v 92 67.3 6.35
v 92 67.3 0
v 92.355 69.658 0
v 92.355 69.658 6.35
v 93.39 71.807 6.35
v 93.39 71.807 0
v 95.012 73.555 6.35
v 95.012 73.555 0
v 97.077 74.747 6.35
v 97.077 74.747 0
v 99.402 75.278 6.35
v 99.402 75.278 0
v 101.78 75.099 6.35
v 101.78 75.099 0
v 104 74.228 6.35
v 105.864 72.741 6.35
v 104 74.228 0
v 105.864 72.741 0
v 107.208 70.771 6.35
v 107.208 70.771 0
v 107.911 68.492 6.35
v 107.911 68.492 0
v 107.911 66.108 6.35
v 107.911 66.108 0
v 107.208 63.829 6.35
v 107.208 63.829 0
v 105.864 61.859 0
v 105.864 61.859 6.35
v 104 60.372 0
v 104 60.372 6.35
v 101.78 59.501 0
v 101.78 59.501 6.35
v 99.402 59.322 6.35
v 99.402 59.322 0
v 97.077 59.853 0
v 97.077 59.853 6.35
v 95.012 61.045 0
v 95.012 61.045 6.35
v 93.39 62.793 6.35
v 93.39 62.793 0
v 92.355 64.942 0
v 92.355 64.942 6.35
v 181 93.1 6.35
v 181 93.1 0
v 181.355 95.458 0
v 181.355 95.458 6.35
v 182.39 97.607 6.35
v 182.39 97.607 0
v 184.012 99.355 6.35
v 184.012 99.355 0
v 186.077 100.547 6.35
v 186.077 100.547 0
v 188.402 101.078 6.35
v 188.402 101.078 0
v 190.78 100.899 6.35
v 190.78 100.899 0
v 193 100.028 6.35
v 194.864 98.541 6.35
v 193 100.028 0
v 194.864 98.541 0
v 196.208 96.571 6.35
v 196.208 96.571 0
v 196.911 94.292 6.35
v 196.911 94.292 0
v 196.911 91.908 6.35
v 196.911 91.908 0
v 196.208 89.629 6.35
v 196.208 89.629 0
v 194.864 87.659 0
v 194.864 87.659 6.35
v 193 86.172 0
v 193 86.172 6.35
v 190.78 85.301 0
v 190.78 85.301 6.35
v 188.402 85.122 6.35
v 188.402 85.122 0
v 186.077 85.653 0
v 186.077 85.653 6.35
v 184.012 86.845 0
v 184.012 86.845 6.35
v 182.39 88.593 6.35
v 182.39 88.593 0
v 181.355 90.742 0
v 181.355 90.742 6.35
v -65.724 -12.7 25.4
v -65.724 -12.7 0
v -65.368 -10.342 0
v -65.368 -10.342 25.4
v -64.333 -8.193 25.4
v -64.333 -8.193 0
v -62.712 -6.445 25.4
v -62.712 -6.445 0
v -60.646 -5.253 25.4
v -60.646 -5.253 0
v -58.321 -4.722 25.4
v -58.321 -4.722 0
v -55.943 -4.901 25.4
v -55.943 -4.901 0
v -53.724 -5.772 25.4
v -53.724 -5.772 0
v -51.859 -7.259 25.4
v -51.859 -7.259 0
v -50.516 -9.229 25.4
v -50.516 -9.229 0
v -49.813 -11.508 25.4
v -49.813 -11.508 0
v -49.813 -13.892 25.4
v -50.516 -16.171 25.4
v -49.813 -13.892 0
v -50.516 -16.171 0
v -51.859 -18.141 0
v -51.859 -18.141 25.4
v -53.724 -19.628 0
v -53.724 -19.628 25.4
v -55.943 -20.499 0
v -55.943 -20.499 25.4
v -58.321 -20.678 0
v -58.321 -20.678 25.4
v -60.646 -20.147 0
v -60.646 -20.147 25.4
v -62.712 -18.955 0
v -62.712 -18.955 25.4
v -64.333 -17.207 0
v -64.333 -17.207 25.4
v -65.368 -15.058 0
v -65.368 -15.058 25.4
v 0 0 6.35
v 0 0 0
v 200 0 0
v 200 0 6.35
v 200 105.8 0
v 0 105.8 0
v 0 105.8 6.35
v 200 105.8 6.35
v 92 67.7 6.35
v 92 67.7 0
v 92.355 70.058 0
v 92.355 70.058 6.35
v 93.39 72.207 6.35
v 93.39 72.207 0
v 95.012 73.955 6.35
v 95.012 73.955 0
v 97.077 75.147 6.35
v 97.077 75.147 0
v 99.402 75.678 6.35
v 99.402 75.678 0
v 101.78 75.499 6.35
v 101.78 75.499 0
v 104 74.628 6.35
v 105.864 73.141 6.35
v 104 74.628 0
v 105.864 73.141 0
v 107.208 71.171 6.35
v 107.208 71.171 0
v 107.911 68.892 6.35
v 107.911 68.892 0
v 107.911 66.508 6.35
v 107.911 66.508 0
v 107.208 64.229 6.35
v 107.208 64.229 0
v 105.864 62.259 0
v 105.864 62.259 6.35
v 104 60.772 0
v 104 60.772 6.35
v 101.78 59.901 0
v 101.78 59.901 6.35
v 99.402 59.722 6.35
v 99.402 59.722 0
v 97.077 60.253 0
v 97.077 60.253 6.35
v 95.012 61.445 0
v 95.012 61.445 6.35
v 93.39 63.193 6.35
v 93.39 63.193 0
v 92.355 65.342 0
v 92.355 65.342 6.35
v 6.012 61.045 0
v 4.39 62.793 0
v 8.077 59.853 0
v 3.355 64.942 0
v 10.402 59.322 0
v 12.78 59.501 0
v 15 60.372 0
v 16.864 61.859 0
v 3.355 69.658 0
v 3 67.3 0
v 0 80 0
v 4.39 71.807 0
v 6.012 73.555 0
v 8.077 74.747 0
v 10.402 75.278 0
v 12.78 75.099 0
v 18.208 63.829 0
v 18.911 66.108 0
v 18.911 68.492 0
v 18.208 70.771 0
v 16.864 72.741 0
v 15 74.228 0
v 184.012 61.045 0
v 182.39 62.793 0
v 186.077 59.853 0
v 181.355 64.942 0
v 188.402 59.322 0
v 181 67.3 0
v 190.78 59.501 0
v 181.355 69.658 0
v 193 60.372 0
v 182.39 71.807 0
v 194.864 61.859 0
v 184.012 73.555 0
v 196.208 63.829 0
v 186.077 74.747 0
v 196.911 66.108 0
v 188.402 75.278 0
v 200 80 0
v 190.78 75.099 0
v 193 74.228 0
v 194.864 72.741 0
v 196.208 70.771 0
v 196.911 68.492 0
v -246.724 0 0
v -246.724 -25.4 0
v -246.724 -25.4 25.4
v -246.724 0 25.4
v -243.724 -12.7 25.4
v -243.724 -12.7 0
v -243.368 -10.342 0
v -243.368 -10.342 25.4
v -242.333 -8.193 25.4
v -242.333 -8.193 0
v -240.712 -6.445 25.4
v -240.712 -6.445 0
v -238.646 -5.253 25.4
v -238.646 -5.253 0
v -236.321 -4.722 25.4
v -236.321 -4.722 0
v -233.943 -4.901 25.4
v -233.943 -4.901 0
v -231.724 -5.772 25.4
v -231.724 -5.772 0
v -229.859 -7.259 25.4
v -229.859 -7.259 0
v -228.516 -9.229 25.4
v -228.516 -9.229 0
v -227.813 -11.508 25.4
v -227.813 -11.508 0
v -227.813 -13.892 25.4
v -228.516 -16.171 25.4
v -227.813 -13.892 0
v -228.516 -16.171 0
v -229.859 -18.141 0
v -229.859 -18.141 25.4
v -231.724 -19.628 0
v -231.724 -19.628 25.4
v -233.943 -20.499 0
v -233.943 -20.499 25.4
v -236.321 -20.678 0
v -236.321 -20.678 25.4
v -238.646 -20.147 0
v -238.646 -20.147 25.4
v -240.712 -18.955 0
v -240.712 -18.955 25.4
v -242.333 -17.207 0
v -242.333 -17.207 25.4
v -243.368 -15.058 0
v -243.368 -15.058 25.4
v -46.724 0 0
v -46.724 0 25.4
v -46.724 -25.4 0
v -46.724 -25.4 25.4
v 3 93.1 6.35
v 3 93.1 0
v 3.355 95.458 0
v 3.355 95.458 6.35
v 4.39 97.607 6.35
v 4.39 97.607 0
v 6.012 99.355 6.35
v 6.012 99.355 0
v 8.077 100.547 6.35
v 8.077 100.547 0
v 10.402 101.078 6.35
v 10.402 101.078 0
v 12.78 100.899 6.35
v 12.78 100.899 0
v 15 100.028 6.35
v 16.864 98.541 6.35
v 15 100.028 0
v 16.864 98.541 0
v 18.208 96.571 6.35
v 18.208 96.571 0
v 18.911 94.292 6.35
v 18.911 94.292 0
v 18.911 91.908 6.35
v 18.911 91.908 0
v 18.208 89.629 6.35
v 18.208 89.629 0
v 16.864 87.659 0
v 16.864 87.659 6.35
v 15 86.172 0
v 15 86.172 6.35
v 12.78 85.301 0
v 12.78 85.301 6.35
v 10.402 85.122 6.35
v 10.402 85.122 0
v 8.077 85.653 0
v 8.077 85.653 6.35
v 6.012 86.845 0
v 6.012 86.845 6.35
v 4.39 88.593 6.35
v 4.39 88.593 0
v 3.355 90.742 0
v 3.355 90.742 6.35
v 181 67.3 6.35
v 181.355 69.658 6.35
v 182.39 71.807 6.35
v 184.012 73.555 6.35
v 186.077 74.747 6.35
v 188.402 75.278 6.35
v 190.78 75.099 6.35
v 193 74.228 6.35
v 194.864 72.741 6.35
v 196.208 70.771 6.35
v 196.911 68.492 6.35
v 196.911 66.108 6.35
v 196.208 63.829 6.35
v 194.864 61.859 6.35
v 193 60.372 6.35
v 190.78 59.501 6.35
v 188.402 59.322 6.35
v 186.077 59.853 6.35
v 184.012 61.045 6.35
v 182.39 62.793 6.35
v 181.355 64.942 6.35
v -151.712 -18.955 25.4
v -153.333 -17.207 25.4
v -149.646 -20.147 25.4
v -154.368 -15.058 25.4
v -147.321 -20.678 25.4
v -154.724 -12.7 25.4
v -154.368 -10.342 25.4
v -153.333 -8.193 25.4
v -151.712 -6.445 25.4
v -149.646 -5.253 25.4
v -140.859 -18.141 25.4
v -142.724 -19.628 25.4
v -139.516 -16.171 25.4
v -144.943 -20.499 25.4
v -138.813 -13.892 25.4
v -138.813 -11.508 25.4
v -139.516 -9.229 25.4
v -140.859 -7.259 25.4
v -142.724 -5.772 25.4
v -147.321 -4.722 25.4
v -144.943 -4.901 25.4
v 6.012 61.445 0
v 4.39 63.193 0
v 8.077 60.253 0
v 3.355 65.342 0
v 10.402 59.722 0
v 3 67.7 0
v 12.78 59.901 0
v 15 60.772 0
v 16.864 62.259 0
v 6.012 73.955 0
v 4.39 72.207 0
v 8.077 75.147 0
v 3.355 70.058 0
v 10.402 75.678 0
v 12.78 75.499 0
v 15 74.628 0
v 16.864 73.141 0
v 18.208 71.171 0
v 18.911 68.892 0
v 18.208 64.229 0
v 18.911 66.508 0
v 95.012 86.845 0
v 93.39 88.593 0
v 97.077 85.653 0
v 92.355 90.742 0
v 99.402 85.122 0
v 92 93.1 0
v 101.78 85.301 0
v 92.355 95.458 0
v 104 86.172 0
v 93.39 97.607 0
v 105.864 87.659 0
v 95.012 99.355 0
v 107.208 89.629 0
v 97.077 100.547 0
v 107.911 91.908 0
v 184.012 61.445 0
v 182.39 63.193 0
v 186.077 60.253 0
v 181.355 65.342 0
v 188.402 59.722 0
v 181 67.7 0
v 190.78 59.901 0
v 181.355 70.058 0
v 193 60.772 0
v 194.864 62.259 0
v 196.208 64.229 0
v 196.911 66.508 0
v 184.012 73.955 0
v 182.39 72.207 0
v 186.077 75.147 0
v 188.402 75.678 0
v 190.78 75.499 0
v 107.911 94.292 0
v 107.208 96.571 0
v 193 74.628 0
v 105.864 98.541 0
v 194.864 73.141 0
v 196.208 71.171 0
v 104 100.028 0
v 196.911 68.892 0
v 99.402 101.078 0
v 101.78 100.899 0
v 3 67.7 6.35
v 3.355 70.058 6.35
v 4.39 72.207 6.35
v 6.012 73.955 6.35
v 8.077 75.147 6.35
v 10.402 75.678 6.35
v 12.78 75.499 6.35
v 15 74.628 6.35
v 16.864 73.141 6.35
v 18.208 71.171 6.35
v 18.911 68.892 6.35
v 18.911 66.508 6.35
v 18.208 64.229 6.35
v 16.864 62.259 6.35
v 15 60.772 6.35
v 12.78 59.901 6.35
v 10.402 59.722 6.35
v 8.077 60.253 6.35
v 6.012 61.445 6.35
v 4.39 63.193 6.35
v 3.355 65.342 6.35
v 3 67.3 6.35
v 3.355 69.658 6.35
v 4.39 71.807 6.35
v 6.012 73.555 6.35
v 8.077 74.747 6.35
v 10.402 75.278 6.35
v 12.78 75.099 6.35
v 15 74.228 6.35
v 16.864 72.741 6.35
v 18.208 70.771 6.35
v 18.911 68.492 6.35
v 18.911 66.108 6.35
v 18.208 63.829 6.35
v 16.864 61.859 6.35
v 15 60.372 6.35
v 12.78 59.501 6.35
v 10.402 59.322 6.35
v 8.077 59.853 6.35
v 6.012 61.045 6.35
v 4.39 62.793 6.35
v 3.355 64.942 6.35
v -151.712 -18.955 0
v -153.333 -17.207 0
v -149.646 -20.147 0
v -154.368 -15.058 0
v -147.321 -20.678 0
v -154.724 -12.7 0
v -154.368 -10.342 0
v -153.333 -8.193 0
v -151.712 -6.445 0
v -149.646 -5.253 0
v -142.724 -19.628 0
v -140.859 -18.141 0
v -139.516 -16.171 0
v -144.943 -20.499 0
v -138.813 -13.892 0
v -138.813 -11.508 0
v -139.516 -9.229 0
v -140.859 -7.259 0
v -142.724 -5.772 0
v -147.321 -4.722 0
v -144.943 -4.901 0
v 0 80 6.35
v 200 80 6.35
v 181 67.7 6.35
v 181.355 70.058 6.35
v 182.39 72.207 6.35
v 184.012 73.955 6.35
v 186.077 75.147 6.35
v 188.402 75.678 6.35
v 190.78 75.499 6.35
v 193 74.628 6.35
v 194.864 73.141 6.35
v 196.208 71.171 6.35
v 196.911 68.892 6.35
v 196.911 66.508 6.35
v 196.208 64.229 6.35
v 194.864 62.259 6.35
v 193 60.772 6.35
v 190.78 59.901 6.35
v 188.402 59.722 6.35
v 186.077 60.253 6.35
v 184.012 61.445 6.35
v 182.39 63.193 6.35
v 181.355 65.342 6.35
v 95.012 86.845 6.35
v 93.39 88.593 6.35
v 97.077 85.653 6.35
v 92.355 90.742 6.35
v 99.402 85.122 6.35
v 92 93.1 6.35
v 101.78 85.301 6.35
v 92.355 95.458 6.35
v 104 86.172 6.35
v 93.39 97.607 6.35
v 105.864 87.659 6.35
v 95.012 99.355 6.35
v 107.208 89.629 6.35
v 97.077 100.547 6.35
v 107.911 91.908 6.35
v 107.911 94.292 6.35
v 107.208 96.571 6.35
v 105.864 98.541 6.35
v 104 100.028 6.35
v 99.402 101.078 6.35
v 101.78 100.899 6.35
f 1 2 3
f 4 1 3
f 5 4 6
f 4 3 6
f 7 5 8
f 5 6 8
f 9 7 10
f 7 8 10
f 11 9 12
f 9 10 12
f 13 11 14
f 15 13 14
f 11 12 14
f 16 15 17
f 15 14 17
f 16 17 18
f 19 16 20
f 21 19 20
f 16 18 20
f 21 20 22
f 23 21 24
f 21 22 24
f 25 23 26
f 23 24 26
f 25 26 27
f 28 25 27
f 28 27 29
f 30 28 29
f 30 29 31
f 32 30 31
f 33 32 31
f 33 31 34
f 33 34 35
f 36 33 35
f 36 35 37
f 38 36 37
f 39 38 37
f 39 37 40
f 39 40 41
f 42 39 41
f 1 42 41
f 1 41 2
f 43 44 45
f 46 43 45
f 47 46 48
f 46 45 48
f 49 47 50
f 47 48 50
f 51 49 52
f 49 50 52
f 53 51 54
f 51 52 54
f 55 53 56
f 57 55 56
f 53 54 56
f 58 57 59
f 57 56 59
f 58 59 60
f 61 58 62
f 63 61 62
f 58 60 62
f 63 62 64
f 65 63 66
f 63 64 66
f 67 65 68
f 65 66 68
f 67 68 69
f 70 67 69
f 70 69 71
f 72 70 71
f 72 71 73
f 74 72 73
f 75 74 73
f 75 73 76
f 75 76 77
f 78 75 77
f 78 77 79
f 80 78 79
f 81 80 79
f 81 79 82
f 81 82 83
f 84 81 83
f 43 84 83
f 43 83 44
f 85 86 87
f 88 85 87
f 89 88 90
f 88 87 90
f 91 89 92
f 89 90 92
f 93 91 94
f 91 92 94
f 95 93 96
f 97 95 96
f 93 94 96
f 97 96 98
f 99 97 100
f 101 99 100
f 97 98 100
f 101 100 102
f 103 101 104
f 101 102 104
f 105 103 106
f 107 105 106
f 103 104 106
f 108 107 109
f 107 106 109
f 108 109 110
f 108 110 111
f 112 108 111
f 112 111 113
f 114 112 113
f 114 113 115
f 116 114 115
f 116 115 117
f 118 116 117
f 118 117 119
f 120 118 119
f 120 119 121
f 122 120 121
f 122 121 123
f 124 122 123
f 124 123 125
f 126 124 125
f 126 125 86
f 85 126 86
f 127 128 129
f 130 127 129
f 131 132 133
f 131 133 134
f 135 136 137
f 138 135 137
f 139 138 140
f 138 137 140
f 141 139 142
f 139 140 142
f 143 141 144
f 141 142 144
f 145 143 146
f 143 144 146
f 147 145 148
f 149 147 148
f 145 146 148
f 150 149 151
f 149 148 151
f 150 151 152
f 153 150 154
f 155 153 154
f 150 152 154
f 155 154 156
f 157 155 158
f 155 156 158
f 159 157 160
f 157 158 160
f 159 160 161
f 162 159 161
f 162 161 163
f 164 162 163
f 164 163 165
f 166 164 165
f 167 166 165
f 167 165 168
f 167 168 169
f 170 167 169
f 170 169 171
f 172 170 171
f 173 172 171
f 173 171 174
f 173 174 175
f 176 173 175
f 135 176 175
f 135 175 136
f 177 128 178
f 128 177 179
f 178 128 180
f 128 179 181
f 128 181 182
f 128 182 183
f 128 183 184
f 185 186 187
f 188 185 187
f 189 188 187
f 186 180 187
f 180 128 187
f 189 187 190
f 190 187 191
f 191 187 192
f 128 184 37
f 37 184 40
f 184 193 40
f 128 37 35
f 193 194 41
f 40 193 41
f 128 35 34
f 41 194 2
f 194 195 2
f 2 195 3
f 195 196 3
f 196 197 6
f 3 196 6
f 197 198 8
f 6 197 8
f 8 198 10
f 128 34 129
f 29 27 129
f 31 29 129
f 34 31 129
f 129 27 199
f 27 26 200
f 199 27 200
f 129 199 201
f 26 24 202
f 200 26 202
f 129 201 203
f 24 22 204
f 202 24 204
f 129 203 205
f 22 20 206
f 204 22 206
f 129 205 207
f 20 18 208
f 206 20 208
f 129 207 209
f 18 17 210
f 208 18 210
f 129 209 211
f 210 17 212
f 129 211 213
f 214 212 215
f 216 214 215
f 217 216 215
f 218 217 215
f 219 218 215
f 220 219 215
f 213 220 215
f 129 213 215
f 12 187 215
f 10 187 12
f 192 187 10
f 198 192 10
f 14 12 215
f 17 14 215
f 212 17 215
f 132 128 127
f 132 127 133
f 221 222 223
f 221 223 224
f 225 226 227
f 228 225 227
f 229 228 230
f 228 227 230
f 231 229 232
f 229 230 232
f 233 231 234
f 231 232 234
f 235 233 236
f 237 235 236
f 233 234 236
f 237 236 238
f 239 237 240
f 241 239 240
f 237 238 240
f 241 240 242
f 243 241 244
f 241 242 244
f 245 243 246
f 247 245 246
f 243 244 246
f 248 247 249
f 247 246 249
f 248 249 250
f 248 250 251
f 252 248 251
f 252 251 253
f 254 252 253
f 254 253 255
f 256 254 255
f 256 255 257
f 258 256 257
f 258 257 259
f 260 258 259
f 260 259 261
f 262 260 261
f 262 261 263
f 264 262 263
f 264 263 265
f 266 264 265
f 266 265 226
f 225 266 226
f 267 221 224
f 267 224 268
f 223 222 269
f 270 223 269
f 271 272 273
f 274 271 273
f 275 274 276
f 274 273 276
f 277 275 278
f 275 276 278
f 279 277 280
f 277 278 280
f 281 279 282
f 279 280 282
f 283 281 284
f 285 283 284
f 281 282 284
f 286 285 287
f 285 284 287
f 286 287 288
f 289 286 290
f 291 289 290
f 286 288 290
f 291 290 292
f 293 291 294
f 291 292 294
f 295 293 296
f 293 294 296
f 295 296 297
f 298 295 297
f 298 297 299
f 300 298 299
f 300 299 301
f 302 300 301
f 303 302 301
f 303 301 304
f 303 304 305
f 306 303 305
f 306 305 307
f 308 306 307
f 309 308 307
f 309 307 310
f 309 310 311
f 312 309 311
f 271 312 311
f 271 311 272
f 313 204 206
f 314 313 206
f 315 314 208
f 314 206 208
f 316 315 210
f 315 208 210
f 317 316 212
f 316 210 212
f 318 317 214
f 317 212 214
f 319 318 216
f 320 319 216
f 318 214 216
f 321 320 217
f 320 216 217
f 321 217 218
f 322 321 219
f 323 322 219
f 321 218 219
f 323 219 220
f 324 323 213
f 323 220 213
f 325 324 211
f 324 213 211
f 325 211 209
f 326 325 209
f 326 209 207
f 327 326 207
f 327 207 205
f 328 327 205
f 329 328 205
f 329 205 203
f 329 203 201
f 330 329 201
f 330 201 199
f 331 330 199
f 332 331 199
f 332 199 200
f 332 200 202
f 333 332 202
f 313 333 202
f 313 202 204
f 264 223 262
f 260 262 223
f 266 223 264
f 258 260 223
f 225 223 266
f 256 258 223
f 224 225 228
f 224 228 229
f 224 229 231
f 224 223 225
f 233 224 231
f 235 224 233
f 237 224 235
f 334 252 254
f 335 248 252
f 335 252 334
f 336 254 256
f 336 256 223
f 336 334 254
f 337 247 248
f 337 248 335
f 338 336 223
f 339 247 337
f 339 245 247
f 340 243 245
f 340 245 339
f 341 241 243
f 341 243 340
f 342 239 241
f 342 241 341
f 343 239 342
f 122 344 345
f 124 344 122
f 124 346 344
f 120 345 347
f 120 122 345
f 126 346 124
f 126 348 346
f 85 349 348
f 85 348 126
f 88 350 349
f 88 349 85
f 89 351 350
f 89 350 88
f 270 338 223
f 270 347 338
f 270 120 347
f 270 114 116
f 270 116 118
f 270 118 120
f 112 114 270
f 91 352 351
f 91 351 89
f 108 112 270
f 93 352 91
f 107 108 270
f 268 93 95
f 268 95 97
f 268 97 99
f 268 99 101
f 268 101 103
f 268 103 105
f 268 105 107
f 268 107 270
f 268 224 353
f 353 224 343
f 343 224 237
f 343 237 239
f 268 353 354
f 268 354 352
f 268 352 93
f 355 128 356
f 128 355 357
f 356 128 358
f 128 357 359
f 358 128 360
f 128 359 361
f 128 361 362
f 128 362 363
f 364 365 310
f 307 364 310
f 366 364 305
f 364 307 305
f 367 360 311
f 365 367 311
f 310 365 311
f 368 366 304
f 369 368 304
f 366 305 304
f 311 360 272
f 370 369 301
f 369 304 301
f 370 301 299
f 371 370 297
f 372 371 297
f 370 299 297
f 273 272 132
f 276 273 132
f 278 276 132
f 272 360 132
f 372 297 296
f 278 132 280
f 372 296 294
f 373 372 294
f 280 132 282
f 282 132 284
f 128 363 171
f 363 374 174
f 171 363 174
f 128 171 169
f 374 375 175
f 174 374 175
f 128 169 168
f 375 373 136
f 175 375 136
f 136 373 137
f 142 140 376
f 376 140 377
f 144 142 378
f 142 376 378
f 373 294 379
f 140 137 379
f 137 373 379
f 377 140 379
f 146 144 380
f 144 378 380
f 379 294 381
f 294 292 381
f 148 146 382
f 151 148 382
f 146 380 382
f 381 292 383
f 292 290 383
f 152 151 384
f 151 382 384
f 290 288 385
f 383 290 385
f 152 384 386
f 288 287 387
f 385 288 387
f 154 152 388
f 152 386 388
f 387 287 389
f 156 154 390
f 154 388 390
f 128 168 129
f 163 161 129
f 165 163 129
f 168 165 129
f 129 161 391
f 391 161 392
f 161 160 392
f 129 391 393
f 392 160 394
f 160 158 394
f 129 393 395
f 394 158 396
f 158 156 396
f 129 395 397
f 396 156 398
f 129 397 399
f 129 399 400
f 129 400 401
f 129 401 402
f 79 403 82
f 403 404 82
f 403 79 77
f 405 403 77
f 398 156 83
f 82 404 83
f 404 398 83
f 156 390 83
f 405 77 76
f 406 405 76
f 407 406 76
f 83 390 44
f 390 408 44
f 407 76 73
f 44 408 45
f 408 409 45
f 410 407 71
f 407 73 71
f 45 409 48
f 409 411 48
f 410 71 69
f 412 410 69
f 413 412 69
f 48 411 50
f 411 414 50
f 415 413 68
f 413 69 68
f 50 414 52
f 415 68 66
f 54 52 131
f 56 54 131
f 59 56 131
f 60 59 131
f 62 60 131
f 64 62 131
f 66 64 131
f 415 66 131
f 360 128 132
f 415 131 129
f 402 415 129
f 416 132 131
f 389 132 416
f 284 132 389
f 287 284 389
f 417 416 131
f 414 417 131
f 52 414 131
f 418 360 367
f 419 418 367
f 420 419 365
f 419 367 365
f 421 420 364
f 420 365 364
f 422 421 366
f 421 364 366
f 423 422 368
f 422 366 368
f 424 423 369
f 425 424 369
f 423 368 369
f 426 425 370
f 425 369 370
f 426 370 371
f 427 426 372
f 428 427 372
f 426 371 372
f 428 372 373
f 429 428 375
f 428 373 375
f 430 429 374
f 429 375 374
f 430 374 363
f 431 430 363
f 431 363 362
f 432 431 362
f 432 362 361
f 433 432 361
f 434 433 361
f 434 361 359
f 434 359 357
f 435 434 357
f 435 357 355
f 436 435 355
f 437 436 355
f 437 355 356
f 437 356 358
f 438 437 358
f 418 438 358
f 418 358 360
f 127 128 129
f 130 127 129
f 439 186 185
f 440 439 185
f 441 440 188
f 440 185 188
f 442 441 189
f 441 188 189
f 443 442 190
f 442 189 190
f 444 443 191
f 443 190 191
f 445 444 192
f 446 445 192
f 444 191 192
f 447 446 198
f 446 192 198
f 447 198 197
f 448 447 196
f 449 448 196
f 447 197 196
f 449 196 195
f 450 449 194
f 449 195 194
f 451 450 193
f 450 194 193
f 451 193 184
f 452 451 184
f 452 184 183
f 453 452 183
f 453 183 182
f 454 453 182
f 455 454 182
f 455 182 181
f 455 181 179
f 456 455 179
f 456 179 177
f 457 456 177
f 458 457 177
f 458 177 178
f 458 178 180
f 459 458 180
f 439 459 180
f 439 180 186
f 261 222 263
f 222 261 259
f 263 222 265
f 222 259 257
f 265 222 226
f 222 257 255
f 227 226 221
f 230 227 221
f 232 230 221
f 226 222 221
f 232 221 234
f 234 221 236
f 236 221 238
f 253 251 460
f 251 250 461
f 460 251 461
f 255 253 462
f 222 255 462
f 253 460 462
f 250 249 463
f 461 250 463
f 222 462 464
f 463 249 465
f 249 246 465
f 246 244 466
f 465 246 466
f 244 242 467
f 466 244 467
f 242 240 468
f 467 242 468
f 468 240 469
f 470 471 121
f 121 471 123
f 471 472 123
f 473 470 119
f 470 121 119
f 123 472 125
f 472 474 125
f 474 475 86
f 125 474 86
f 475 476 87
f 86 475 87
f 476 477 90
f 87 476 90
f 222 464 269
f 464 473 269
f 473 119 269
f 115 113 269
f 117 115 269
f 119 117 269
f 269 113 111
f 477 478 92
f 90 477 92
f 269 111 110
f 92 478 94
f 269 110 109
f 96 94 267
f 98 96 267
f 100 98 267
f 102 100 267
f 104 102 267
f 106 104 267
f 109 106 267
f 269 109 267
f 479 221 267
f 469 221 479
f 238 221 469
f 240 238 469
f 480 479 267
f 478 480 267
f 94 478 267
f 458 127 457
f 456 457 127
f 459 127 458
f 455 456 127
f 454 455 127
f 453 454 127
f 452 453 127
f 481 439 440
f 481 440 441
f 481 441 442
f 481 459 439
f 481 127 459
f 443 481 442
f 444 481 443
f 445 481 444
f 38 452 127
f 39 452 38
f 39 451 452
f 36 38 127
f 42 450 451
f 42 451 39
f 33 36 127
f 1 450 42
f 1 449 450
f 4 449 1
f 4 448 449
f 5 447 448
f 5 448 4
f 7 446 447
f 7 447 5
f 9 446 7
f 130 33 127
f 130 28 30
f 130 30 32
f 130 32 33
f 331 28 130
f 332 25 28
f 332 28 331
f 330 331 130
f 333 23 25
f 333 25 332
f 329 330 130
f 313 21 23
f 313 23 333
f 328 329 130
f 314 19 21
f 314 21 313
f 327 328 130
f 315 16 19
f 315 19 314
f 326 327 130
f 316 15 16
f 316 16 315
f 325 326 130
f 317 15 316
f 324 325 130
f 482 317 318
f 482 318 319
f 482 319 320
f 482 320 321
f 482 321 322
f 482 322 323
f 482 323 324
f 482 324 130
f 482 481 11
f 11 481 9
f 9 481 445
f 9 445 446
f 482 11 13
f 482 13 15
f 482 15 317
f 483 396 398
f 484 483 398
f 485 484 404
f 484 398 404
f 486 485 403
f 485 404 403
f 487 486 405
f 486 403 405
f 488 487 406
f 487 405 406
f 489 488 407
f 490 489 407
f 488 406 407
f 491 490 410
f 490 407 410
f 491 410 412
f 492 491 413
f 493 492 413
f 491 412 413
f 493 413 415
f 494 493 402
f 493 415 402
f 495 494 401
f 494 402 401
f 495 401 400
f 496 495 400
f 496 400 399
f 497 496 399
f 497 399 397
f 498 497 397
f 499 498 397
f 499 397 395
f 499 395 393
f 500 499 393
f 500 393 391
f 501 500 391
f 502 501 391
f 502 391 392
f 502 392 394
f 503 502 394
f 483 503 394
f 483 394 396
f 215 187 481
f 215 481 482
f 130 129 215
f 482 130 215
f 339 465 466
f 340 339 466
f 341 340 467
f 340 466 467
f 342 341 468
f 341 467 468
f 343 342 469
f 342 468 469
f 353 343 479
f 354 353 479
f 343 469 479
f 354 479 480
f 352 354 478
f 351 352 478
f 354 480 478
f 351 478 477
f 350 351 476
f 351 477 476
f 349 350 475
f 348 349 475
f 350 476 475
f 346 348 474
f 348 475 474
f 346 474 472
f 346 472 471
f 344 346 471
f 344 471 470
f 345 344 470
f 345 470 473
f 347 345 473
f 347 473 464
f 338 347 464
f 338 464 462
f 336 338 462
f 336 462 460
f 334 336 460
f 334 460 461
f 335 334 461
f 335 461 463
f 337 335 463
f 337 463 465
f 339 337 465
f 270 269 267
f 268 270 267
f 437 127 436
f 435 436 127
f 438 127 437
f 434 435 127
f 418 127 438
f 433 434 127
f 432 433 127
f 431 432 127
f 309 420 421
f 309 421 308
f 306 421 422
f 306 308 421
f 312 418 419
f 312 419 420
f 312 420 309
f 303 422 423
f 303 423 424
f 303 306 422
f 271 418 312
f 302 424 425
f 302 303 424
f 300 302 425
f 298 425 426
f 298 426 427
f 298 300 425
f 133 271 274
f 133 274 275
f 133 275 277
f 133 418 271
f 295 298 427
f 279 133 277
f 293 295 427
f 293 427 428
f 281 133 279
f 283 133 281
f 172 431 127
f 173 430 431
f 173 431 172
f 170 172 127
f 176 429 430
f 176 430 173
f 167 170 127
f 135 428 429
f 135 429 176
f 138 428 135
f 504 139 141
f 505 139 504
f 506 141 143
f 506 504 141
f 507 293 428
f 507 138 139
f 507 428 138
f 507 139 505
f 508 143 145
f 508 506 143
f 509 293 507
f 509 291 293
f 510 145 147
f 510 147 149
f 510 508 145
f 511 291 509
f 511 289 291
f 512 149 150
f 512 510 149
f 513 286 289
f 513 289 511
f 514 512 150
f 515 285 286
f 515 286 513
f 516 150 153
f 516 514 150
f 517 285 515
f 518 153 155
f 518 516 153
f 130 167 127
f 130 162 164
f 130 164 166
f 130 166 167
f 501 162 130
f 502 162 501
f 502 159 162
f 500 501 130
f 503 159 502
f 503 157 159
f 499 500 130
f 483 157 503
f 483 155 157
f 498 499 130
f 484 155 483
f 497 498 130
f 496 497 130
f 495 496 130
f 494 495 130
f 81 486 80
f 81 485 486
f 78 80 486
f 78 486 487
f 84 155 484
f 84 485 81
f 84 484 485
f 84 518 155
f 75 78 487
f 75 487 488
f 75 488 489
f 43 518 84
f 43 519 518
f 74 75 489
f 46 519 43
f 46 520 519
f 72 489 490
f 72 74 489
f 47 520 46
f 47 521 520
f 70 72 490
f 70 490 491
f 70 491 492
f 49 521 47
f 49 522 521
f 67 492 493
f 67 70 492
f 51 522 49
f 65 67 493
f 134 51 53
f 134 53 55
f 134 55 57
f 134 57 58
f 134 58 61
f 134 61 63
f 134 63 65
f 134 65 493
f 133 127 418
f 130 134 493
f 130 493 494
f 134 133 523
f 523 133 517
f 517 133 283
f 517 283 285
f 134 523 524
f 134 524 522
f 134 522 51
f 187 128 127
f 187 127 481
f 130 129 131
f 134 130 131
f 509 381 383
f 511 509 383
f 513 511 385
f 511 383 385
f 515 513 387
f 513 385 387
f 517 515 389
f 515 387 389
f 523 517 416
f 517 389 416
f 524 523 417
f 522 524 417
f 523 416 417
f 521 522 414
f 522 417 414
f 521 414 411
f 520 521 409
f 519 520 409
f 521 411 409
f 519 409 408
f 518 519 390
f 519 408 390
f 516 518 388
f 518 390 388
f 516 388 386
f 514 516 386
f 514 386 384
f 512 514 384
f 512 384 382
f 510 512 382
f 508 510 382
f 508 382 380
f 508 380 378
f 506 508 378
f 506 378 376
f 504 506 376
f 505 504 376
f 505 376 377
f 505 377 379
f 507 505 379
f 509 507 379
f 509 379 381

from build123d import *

# Parameters (mm, degrees)
F0_W     = 200
F0_H     = 80
F1_DEPTH = 6.35
F3_D     = 16
F4_W     = 200
F4_H     = 25.4
F5_DEPTH = 25.4
F7_D     = 16
F8_W     = 200
F8_H     = 105.8
F9_DEPTH = 6.35
F11_D    = 16


with BuildPart() as f1:
    # F0 (on Top) → F1 (new body)
    with BuildSketch(Plane.XY):
        with Locations((100, 40)):
            Rectangle(F0_W, F0_H)
    extrude(amount=F1_DEPTH)

    # F3 (through all)
    with Locations(Plane.XY.offset(6.35)):
        with Locations((11, 67.3), (100, 67.3), (189, 67.3)):
            Hole(F3_D / 2)


with BuildPart() as f5:
    # F4 (on Top) → F5 (new body)
    with BuildSketch(Plane.XY):
        with Locations((-146.7235868836, -12.7)):
            Rectangle(F4_W, F4_H)
    extrude(amount=F5_DEPTH)

    # F7 (through all)
    with Locations(Plane.XY.offset(25.4)):
        with Locations((-57.7235868836, -12.7), (-146.7235868836, -12.7), (-235.7235868836, -12.7)):
            Hole(F7_D / 2)


with BuildPart() as f9:
    # F8 (on Top) → F9 (new body)
    with BuildSketch(Plane.XY):
        with Locations((100, 52.9)):
            Rectangle(F8_W, F8_H)
    extrude(amount=F9_DEPTH)

    # F11 (through all)
    with Locations(Plane.XY.offset(6.35)):
        with Locations((11, 93.1), (100, 93.1), (189, 93.1), (189, 67.7), (100, 67.7), (11, 67.7)):
            Hole(F11_D / 2)


solid = Compound([f1.part, f5.part, f9.part])
